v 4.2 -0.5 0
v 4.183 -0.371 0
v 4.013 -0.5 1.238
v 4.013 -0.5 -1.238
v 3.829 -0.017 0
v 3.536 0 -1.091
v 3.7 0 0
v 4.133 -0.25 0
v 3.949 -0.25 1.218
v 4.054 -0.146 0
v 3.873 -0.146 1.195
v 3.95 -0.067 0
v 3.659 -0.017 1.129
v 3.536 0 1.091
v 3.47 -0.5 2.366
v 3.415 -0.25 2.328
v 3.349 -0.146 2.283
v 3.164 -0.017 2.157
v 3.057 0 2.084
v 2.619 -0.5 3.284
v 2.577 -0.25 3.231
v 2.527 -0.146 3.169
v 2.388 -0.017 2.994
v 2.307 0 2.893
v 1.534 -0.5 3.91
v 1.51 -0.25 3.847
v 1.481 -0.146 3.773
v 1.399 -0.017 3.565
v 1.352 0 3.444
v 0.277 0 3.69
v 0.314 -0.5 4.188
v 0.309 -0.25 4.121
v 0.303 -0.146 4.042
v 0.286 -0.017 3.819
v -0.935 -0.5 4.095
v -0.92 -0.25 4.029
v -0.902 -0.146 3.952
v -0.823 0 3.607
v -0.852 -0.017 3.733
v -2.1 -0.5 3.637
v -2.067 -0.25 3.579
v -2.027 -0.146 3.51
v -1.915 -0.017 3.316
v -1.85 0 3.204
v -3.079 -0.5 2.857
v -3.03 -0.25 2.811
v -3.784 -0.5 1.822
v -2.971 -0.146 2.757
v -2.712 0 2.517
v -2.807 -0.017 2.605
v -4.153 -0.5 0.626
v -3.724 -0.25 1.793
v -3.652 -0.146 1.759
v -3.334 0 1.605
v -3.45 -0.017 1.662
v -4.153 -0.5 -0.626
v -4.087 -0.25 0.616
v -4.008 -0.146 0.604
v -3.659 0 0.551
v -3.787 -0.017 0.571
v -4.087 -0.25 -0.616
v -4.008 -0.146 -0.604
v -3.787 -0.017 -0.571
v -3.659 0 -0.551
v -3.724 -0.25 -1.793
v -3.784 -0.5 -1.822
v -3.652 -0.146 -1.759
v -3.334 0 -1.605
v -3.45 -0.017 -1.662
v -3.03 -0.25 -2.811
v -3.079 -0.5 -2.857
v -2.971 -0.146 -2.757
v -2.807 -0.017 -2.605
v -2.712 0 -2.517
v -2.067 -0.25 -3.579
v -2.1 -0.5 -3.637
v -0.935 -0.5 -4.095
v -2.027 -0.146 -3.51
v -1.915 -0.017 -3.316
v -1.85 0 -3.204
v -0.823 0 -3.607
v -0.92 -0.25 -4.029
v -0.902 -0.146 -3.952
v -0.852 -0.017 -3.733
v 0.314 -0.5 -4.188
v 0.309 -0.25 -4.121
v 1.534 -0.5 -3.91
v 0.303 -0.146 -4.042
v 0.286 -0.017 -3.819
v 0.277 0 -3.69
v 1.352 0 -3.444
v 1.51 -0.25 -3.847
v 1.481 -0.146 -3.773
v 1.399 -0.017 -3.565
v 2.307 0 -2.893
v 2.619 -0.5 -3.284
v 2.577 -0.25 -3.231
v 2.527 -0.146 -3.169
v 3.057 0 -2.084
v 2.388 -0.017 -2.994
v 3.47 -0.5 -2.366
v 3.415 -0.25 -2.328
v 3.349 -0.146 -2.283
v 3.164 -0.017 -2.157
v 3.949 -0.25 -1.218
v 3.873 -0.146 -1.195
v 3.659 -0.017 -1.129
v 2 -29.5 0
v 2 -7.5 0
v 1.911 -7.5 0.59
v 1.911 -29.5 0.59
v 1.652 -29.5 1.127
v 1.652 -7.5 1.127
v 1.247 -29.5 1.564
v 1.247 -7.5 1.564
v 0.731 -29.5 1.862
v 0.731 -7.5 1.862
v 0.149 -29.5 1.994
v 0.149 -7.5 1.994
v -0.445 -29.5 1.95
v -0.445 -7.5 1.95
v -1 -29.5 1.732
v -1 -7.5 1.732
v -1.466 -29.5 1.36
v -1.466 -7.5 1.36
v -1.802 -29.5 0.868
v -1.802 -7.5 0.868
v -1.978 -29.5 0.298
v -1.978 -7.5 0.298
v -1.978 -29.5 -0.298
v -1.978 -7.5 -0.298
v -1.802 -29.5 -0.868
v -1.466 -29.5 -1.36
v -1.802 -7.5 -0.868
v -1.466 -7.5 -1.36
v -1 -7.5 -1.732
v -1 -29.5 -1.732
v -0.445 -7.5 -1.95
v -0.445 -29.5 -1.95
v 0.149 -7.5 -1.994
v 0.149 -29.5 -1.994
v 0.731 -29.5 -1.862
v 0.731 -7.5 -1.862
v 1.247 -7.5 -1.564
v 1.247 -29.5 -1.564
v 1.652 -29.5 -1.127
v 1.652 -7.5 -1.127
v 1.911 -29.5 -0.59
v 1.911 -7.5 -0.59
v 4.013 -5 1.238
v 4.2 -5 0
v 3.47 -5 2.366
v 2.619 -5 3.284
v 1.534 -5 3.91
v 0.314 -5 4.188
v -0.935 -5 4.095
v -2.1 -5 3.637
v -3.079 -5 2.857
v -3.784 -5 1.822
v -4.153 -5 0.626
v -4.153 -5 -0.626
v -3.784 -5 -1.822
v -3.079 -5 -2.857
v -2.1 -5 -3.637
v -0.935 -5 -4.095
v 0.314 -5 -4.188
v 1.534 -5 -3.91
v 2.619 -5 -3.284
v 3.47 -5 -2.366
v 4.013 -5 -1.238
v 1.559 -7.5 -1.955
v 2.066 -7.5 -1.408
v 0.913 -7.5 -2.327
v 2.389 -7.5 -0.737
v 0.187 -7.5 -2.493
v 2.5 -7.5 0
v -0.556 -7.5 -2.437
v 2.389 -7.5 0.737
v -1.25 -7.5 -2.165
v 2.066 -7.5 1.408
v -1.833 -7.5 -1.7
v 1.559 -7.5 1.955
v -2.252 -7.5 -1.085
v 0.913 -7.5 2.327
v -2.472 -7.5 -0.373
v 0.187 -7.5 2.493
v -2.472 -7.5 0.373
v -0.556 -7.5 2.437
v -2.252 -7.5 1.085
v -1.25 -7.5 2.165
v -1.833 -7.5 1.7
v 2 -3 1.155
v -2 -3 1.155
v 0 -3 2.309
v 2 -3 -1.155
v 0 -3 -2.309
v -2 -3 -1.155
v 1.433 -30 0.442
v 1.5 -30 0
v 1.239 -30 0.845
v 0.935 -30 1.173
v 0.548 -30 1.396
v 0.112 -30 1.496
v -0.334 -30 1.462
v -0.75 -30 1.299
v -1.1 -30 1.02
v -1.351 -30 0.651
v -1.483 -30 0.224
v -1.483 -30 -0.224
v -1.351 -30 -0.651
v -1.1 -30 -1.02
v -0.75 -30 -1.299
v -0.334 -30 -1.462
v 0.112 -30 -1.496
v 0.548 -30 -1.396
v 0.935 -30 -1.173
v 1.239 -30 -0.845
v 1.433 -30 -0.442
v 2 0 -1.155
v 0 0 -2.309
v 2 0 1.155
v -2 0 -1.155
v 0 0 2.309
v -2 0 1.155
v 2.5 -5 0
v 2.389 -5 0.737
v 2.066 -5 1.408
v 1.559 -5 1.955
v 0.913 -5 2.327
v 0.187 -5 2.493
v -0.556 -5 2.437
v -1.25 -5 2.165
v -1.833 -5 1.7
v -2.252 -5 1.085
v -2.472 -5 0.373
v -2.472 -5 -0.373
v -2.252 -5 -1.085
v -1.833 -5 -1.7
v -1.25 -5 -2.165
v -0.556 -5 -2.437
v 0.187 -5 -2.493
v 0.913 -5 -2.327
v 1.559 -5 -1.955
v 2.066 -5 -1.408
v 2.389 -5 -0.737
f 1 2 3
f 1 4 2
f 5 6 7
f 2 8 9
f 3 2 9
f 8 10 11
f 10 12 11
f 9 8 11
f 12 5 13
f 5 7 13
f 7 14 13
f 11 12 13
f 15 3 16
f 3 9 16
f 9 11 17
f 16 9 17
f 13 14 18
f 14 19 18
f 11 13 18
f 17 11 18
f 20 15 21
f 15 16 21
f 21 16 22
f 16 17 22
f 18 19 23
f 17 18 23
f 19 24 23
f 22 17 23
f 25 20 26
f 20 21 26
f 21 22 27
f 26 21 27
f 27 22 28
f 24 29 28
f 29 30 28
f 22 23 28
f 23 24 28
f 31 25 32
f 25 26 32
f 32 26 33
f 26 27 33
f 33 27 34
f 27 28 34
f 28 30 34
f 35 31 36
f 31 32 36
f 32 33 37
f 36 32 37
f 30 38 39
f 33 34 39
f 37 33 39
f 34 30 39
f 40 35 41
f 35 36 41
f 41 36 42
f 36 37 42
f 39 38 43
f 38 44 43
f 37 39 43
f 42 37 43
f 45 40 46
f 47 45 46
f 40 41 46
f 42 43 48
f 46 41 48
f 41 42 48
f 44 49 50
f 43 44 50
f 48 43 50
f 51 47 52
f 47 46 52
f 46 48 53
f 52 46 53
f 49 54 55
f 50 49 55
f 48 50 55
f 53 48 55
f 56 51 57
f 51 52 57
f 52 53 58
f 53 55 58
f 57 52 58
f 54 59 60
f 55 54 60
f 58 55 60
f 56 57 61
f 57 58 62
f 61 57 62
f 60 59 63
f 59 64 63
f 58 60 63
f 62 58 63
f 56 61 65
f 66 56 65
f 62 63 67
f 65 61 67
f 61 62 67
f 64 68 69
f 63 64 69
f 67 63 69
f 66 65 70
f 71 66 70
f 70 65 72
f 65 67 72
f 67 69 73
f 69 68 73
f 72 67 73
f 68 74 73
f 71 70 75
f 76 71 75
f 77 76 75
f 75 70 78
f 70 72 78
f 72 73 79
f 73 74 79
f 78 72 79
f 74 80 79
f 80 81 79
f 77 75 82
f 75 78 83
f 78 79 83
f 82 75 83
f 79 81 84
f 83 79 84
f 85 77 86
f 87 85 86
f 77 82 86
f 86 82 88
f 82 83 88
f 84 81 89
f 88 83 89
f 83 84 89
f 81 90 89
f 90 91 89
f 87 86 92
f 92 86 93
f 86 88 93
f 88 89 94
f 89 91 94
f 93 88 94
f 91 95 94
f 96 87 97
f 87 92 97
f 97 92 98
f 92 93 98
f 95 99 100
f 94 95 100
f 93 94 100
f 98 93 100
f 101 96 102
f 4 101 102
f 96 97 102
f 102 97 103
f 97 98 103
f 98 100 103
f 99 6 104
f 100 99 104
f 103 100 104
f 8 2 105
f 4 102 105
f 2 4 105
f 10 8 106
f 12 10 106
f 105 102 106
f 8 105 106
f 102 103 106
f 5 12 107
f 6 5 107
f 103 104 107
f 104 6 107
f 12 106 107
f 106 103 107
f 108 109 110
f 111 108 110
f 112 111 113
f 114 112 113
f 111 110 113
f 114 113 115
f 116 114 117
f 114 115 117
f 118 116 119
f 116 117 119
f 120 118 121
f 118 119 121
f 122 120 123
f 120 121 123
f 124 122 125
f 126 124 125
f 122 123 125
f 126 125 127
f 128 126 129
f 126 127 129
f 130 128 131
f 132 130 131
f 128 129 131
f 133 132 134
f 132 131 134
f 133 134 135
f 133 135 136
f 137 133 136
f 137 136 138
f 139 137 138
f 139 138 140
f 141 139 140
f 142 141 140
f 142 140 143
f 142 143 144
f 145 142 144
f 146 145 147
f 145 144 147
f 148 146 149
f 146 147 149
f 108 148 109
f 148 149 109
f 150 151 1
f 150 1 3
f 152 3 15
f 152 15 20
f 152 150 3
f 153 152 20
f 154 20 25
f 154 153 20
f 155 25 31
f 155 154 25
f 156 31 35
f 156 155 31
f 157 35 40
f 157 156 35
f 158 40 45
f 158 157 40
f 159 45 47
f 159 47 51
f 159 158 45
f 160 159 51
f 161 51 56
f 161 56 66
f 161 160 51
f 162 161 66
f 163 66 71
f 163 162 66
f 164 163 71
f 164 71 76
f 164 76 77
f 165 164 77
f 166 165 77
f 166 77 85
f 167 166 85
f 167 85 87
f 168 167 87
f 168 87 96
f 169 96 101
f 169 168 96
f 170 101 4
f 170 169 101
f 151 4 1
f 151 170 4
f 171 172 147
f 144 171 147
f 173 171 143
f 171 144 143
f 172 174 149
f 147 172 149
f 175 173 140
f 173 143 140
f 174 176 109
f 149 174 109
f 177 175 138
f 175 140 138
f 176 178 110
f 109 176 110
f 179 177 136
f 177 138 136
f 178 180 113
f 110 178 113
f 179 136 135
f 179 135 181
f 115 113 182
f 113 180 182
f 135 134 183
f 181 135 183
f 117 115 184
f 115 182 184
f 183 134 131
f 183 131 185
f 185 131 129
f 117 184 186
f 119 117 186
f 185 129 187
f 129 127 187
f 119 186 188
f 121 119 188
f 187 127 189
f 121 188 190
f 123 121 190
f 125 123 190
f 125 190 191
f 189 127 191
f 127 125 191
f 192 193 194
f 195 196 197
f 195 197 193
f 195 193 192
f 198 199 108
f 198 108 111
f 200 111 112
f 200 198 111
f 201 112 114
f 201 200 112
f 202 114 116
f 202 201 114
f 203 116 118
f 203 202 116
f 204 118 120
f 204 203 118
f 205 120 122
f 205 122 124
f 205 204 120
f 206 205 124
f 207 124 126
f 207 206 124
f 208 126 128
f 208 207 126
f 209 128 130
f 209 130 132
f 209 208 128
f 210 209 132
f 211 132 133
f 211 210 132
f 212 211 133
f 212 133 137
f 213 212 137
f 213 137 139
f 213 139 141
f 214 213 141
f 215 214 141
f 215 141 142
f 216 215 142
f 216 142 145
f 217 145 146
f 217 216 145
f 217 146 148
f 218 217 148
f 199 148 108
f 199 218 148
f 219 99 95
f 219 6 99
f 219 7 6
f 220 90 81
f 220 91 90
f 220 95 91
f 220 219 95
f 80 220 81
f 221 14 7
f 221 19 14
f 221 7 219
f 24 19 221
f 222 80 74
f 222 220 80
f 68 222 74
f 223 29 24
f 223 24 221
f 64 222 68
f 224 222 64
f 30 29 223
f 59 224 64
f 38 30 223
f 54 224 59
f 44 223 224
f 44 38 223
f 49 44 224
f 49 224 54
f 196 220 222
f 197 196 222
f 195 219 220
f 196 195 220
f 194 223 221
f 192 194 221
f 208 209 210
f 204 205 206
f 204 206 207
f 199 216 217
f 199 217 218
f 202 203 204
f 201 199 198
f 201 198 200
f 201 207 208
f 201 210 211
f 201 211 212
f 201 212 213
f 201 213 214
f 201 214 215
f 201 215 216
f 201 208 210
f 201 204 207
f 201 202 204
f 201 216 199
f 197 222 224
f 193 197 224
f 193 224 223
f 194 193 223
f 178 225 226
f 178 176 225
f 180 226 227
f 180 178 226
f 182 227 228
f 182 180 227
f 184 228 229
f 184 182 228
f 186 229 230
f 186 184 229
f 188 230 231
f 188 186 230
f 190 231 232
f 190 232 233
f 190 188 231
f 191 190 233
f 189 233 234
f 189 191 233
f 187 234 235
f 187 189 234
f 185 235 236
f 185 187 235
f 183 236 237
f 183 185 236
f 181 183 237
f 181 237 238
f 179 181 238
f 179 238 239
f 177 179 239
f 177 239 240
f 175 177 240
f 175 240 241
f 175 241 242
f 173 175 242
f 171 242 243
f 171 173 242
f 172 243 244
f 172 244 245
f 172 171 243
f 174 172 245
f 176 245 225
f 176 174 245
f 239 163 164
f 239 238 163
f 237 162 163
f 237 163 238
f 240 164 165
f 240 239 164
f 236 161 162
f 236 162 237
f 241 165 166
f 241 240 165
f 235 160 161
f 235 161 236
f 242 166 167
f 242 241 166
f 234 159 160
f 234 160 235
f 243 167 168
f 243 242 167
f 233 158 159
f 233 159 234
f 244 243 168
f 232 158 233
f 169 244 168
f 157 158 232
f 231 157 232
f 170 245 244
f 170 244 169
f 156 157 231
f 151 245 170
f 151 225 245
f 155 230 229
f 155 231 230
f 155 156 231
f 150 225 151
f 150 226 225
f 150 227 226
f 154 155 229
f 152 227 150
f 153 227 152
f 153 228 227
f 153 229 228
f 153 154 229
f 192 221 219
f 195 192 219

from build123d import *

# Parameters (mm, degrees)
CORTAR_EXTRUIR1_DEPTH = 3
CHAFL_N1_SIZE         = 0.5
REDONDEO1_R           = 0.5
CROQUIS3_W            = 0.5
CROQUIS3_H            = 22.5
CHAFL_N2_SIZE         = 0.5


with BuildPart() as part:
    # Croquis1 → Revolución1 (revolve)
    with BuildSketch(Plane.XY):
        Polygon((0, 0), (4.2, 0), (4.2, -5), (2.5, -5), (2.5, -30), (0, -30), align=None)
    revolve(axis=Axis((0, 0, 0), (0, -1, 0)))

    # Croquis2 → Cortar-Extruir1 (cut)
    with BuildSketch(Plane(origin=(0, 0, 0), x_dir=(1, 0, 0), z_dir=(0, 1, 0))):
        Polygon((2, 1.154700538), (0, 2.309401077), (-2, 1.154700538), (-2, -1.154700538), (0, -2.309401077), (2, -1.154700538), align=None)
    extrude(amount=-CORTAR_EXTRUIR1_DEPTH, mode=Mode.SUBTRACT)

    # Chaflán1
    chafl_n1_edges = [part.edges().sort_by_distance(p)[0] for p in [
        (-2.5, -30, 0),
    ]]
    chamfer(chafl_n1_edges, length=CHAFL_N1_SIZE)

    # Redondeo1
    redondeo1_edges = [part.edges().sort_by_distance(p)[0] for p in [
        (-4.2, 0, 0),
    ]]
    fillet(redondeo1_edges, radius=REDONDEO1_R)

    # Croquis3 → Cortar-Revolución1 (revolve, cut)
    with BuildSketch(Plane.XY):
        with Locations((2.25, -18.75)):
            Rectangle(CROQUIS3_W, CROQUIS3_H)
    revolve(axis=Axis((0, 0, 0), (0, -1, 0)), mode=Mode.SUBTRACT)

    # Chaflán2
    chafl_n2_edges = [part.edges().sort_by_distance(p)[0] for p in [
        (-2, -30, 0),
    ]]
    chamfer(chafl_n2_edges, length=CHAFL_N2_SIZE)


solid = part.part
